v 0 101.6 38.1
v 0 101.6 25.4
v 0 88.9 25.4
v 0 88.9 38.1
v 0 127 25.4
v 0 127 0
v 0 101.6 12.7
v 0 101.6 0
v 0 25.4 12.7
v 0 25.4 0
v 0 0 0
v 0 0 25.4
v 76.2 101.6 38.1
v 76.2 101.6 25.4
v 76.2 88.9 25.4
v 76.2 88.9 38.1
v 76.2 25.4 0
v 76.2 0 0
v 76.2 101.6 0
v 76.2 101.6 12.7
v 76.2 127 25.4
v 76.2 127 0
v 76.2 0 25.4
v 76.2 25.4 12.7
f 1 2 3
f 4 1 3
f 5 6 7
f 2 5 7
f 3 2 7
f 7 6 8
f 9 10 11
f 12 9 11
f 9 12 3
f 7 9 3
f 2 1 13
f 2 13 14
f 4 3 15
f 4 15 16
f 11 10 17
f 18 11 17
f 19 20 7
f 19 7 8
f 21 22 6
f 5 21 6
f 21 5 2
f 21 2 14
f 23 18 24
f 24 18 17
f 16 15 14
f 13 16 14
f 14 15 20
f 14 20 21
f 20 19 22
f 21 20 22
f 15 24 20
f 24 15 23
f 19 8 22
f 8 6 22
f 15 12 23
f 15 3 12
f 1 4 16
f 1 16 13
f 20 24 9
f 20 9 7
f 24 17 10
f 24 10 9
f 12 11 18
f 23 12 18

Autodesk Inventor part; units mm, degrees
ref_plane "YZ Plane" through (0, 0, 0) normal (1, 0, 0) x (0, 1, 0)
ref_plane "XZ Plane" through (0, 0, 0) normal (0, 1, 0) x (-1, 0, 0)
ref_plane "XY Plane" through (0, 0, 0) normal (0, 0, 1) x (1, 0, 0)
sketch "Sketch1" plane through (0, 0, 0) normal (0, 0, 1) x (1, 0, 0)
  line L0 (0, 0) -> (76.2, 0)
  line L1 (76.2, 0) -> (76.2, 127)
  line L2 (76.2, 127) -> (0, 127)
  line L3 (0, 127) -> (0, 0)
  dimension "d0" = 76.2
  dimension "d1" = 127
extrude "Extrusion1" add sketch "Sketch1" along normal blind 25.4
sketch "Sketch2" plane through (76.2, 0, 0) normal (1, 0, 0) x (0, 0, -1)
  line L0 (0, 0) -> (-25.4, 0) projected
  line L1 (0, 0) -> (0, 127) projected
  line L2 (0, 127) -> (-25.4, 127) projected
  line L3 (0, 25.4) -> (-12.7, 25.4)
  line L4 (-12.7, 25.4) -> (-12.7, 101.6)
  line L5 (-12.7, 101.6) -> (0, 101.6)
  line L6 (0, 101.6) -> (0, 25.4)
  dimension "d4" = 12.7
  dimension "d5" = 25.4
  dimension "d6" = 25.4
extrude "Extrusion2" cut sketch "Sketch2" against normal through all
sketch "Sketch3" plane through (76.2, 0, 25.4) normal (1, 0, 0) x (0, 0, -1)
  line L0 (0, 127) -> (0, 0) projected
  line L1 (0, 88.9) -> (-12.7, 88.9)
  line L2 (-12.7, 88.9) -> (-12.7, 101.6)
  line L3 (-12.7, 101.6) -> (0, 101.6)
  line L4 (0, 101.6) -> (0, 88.9)
  line L5 (25.4, 127) -> (0, 127) projected
  dimension "d9" = 12.7
  dimension "d10" = 12.7
  dimension "d14" = 25.4
extrude "Extrusion3" add sketch "Sketch3" against normal up to surface (76.2 mm away) from surface at 0
equation "\"d6\" = d5"
properties part number "Slider"
